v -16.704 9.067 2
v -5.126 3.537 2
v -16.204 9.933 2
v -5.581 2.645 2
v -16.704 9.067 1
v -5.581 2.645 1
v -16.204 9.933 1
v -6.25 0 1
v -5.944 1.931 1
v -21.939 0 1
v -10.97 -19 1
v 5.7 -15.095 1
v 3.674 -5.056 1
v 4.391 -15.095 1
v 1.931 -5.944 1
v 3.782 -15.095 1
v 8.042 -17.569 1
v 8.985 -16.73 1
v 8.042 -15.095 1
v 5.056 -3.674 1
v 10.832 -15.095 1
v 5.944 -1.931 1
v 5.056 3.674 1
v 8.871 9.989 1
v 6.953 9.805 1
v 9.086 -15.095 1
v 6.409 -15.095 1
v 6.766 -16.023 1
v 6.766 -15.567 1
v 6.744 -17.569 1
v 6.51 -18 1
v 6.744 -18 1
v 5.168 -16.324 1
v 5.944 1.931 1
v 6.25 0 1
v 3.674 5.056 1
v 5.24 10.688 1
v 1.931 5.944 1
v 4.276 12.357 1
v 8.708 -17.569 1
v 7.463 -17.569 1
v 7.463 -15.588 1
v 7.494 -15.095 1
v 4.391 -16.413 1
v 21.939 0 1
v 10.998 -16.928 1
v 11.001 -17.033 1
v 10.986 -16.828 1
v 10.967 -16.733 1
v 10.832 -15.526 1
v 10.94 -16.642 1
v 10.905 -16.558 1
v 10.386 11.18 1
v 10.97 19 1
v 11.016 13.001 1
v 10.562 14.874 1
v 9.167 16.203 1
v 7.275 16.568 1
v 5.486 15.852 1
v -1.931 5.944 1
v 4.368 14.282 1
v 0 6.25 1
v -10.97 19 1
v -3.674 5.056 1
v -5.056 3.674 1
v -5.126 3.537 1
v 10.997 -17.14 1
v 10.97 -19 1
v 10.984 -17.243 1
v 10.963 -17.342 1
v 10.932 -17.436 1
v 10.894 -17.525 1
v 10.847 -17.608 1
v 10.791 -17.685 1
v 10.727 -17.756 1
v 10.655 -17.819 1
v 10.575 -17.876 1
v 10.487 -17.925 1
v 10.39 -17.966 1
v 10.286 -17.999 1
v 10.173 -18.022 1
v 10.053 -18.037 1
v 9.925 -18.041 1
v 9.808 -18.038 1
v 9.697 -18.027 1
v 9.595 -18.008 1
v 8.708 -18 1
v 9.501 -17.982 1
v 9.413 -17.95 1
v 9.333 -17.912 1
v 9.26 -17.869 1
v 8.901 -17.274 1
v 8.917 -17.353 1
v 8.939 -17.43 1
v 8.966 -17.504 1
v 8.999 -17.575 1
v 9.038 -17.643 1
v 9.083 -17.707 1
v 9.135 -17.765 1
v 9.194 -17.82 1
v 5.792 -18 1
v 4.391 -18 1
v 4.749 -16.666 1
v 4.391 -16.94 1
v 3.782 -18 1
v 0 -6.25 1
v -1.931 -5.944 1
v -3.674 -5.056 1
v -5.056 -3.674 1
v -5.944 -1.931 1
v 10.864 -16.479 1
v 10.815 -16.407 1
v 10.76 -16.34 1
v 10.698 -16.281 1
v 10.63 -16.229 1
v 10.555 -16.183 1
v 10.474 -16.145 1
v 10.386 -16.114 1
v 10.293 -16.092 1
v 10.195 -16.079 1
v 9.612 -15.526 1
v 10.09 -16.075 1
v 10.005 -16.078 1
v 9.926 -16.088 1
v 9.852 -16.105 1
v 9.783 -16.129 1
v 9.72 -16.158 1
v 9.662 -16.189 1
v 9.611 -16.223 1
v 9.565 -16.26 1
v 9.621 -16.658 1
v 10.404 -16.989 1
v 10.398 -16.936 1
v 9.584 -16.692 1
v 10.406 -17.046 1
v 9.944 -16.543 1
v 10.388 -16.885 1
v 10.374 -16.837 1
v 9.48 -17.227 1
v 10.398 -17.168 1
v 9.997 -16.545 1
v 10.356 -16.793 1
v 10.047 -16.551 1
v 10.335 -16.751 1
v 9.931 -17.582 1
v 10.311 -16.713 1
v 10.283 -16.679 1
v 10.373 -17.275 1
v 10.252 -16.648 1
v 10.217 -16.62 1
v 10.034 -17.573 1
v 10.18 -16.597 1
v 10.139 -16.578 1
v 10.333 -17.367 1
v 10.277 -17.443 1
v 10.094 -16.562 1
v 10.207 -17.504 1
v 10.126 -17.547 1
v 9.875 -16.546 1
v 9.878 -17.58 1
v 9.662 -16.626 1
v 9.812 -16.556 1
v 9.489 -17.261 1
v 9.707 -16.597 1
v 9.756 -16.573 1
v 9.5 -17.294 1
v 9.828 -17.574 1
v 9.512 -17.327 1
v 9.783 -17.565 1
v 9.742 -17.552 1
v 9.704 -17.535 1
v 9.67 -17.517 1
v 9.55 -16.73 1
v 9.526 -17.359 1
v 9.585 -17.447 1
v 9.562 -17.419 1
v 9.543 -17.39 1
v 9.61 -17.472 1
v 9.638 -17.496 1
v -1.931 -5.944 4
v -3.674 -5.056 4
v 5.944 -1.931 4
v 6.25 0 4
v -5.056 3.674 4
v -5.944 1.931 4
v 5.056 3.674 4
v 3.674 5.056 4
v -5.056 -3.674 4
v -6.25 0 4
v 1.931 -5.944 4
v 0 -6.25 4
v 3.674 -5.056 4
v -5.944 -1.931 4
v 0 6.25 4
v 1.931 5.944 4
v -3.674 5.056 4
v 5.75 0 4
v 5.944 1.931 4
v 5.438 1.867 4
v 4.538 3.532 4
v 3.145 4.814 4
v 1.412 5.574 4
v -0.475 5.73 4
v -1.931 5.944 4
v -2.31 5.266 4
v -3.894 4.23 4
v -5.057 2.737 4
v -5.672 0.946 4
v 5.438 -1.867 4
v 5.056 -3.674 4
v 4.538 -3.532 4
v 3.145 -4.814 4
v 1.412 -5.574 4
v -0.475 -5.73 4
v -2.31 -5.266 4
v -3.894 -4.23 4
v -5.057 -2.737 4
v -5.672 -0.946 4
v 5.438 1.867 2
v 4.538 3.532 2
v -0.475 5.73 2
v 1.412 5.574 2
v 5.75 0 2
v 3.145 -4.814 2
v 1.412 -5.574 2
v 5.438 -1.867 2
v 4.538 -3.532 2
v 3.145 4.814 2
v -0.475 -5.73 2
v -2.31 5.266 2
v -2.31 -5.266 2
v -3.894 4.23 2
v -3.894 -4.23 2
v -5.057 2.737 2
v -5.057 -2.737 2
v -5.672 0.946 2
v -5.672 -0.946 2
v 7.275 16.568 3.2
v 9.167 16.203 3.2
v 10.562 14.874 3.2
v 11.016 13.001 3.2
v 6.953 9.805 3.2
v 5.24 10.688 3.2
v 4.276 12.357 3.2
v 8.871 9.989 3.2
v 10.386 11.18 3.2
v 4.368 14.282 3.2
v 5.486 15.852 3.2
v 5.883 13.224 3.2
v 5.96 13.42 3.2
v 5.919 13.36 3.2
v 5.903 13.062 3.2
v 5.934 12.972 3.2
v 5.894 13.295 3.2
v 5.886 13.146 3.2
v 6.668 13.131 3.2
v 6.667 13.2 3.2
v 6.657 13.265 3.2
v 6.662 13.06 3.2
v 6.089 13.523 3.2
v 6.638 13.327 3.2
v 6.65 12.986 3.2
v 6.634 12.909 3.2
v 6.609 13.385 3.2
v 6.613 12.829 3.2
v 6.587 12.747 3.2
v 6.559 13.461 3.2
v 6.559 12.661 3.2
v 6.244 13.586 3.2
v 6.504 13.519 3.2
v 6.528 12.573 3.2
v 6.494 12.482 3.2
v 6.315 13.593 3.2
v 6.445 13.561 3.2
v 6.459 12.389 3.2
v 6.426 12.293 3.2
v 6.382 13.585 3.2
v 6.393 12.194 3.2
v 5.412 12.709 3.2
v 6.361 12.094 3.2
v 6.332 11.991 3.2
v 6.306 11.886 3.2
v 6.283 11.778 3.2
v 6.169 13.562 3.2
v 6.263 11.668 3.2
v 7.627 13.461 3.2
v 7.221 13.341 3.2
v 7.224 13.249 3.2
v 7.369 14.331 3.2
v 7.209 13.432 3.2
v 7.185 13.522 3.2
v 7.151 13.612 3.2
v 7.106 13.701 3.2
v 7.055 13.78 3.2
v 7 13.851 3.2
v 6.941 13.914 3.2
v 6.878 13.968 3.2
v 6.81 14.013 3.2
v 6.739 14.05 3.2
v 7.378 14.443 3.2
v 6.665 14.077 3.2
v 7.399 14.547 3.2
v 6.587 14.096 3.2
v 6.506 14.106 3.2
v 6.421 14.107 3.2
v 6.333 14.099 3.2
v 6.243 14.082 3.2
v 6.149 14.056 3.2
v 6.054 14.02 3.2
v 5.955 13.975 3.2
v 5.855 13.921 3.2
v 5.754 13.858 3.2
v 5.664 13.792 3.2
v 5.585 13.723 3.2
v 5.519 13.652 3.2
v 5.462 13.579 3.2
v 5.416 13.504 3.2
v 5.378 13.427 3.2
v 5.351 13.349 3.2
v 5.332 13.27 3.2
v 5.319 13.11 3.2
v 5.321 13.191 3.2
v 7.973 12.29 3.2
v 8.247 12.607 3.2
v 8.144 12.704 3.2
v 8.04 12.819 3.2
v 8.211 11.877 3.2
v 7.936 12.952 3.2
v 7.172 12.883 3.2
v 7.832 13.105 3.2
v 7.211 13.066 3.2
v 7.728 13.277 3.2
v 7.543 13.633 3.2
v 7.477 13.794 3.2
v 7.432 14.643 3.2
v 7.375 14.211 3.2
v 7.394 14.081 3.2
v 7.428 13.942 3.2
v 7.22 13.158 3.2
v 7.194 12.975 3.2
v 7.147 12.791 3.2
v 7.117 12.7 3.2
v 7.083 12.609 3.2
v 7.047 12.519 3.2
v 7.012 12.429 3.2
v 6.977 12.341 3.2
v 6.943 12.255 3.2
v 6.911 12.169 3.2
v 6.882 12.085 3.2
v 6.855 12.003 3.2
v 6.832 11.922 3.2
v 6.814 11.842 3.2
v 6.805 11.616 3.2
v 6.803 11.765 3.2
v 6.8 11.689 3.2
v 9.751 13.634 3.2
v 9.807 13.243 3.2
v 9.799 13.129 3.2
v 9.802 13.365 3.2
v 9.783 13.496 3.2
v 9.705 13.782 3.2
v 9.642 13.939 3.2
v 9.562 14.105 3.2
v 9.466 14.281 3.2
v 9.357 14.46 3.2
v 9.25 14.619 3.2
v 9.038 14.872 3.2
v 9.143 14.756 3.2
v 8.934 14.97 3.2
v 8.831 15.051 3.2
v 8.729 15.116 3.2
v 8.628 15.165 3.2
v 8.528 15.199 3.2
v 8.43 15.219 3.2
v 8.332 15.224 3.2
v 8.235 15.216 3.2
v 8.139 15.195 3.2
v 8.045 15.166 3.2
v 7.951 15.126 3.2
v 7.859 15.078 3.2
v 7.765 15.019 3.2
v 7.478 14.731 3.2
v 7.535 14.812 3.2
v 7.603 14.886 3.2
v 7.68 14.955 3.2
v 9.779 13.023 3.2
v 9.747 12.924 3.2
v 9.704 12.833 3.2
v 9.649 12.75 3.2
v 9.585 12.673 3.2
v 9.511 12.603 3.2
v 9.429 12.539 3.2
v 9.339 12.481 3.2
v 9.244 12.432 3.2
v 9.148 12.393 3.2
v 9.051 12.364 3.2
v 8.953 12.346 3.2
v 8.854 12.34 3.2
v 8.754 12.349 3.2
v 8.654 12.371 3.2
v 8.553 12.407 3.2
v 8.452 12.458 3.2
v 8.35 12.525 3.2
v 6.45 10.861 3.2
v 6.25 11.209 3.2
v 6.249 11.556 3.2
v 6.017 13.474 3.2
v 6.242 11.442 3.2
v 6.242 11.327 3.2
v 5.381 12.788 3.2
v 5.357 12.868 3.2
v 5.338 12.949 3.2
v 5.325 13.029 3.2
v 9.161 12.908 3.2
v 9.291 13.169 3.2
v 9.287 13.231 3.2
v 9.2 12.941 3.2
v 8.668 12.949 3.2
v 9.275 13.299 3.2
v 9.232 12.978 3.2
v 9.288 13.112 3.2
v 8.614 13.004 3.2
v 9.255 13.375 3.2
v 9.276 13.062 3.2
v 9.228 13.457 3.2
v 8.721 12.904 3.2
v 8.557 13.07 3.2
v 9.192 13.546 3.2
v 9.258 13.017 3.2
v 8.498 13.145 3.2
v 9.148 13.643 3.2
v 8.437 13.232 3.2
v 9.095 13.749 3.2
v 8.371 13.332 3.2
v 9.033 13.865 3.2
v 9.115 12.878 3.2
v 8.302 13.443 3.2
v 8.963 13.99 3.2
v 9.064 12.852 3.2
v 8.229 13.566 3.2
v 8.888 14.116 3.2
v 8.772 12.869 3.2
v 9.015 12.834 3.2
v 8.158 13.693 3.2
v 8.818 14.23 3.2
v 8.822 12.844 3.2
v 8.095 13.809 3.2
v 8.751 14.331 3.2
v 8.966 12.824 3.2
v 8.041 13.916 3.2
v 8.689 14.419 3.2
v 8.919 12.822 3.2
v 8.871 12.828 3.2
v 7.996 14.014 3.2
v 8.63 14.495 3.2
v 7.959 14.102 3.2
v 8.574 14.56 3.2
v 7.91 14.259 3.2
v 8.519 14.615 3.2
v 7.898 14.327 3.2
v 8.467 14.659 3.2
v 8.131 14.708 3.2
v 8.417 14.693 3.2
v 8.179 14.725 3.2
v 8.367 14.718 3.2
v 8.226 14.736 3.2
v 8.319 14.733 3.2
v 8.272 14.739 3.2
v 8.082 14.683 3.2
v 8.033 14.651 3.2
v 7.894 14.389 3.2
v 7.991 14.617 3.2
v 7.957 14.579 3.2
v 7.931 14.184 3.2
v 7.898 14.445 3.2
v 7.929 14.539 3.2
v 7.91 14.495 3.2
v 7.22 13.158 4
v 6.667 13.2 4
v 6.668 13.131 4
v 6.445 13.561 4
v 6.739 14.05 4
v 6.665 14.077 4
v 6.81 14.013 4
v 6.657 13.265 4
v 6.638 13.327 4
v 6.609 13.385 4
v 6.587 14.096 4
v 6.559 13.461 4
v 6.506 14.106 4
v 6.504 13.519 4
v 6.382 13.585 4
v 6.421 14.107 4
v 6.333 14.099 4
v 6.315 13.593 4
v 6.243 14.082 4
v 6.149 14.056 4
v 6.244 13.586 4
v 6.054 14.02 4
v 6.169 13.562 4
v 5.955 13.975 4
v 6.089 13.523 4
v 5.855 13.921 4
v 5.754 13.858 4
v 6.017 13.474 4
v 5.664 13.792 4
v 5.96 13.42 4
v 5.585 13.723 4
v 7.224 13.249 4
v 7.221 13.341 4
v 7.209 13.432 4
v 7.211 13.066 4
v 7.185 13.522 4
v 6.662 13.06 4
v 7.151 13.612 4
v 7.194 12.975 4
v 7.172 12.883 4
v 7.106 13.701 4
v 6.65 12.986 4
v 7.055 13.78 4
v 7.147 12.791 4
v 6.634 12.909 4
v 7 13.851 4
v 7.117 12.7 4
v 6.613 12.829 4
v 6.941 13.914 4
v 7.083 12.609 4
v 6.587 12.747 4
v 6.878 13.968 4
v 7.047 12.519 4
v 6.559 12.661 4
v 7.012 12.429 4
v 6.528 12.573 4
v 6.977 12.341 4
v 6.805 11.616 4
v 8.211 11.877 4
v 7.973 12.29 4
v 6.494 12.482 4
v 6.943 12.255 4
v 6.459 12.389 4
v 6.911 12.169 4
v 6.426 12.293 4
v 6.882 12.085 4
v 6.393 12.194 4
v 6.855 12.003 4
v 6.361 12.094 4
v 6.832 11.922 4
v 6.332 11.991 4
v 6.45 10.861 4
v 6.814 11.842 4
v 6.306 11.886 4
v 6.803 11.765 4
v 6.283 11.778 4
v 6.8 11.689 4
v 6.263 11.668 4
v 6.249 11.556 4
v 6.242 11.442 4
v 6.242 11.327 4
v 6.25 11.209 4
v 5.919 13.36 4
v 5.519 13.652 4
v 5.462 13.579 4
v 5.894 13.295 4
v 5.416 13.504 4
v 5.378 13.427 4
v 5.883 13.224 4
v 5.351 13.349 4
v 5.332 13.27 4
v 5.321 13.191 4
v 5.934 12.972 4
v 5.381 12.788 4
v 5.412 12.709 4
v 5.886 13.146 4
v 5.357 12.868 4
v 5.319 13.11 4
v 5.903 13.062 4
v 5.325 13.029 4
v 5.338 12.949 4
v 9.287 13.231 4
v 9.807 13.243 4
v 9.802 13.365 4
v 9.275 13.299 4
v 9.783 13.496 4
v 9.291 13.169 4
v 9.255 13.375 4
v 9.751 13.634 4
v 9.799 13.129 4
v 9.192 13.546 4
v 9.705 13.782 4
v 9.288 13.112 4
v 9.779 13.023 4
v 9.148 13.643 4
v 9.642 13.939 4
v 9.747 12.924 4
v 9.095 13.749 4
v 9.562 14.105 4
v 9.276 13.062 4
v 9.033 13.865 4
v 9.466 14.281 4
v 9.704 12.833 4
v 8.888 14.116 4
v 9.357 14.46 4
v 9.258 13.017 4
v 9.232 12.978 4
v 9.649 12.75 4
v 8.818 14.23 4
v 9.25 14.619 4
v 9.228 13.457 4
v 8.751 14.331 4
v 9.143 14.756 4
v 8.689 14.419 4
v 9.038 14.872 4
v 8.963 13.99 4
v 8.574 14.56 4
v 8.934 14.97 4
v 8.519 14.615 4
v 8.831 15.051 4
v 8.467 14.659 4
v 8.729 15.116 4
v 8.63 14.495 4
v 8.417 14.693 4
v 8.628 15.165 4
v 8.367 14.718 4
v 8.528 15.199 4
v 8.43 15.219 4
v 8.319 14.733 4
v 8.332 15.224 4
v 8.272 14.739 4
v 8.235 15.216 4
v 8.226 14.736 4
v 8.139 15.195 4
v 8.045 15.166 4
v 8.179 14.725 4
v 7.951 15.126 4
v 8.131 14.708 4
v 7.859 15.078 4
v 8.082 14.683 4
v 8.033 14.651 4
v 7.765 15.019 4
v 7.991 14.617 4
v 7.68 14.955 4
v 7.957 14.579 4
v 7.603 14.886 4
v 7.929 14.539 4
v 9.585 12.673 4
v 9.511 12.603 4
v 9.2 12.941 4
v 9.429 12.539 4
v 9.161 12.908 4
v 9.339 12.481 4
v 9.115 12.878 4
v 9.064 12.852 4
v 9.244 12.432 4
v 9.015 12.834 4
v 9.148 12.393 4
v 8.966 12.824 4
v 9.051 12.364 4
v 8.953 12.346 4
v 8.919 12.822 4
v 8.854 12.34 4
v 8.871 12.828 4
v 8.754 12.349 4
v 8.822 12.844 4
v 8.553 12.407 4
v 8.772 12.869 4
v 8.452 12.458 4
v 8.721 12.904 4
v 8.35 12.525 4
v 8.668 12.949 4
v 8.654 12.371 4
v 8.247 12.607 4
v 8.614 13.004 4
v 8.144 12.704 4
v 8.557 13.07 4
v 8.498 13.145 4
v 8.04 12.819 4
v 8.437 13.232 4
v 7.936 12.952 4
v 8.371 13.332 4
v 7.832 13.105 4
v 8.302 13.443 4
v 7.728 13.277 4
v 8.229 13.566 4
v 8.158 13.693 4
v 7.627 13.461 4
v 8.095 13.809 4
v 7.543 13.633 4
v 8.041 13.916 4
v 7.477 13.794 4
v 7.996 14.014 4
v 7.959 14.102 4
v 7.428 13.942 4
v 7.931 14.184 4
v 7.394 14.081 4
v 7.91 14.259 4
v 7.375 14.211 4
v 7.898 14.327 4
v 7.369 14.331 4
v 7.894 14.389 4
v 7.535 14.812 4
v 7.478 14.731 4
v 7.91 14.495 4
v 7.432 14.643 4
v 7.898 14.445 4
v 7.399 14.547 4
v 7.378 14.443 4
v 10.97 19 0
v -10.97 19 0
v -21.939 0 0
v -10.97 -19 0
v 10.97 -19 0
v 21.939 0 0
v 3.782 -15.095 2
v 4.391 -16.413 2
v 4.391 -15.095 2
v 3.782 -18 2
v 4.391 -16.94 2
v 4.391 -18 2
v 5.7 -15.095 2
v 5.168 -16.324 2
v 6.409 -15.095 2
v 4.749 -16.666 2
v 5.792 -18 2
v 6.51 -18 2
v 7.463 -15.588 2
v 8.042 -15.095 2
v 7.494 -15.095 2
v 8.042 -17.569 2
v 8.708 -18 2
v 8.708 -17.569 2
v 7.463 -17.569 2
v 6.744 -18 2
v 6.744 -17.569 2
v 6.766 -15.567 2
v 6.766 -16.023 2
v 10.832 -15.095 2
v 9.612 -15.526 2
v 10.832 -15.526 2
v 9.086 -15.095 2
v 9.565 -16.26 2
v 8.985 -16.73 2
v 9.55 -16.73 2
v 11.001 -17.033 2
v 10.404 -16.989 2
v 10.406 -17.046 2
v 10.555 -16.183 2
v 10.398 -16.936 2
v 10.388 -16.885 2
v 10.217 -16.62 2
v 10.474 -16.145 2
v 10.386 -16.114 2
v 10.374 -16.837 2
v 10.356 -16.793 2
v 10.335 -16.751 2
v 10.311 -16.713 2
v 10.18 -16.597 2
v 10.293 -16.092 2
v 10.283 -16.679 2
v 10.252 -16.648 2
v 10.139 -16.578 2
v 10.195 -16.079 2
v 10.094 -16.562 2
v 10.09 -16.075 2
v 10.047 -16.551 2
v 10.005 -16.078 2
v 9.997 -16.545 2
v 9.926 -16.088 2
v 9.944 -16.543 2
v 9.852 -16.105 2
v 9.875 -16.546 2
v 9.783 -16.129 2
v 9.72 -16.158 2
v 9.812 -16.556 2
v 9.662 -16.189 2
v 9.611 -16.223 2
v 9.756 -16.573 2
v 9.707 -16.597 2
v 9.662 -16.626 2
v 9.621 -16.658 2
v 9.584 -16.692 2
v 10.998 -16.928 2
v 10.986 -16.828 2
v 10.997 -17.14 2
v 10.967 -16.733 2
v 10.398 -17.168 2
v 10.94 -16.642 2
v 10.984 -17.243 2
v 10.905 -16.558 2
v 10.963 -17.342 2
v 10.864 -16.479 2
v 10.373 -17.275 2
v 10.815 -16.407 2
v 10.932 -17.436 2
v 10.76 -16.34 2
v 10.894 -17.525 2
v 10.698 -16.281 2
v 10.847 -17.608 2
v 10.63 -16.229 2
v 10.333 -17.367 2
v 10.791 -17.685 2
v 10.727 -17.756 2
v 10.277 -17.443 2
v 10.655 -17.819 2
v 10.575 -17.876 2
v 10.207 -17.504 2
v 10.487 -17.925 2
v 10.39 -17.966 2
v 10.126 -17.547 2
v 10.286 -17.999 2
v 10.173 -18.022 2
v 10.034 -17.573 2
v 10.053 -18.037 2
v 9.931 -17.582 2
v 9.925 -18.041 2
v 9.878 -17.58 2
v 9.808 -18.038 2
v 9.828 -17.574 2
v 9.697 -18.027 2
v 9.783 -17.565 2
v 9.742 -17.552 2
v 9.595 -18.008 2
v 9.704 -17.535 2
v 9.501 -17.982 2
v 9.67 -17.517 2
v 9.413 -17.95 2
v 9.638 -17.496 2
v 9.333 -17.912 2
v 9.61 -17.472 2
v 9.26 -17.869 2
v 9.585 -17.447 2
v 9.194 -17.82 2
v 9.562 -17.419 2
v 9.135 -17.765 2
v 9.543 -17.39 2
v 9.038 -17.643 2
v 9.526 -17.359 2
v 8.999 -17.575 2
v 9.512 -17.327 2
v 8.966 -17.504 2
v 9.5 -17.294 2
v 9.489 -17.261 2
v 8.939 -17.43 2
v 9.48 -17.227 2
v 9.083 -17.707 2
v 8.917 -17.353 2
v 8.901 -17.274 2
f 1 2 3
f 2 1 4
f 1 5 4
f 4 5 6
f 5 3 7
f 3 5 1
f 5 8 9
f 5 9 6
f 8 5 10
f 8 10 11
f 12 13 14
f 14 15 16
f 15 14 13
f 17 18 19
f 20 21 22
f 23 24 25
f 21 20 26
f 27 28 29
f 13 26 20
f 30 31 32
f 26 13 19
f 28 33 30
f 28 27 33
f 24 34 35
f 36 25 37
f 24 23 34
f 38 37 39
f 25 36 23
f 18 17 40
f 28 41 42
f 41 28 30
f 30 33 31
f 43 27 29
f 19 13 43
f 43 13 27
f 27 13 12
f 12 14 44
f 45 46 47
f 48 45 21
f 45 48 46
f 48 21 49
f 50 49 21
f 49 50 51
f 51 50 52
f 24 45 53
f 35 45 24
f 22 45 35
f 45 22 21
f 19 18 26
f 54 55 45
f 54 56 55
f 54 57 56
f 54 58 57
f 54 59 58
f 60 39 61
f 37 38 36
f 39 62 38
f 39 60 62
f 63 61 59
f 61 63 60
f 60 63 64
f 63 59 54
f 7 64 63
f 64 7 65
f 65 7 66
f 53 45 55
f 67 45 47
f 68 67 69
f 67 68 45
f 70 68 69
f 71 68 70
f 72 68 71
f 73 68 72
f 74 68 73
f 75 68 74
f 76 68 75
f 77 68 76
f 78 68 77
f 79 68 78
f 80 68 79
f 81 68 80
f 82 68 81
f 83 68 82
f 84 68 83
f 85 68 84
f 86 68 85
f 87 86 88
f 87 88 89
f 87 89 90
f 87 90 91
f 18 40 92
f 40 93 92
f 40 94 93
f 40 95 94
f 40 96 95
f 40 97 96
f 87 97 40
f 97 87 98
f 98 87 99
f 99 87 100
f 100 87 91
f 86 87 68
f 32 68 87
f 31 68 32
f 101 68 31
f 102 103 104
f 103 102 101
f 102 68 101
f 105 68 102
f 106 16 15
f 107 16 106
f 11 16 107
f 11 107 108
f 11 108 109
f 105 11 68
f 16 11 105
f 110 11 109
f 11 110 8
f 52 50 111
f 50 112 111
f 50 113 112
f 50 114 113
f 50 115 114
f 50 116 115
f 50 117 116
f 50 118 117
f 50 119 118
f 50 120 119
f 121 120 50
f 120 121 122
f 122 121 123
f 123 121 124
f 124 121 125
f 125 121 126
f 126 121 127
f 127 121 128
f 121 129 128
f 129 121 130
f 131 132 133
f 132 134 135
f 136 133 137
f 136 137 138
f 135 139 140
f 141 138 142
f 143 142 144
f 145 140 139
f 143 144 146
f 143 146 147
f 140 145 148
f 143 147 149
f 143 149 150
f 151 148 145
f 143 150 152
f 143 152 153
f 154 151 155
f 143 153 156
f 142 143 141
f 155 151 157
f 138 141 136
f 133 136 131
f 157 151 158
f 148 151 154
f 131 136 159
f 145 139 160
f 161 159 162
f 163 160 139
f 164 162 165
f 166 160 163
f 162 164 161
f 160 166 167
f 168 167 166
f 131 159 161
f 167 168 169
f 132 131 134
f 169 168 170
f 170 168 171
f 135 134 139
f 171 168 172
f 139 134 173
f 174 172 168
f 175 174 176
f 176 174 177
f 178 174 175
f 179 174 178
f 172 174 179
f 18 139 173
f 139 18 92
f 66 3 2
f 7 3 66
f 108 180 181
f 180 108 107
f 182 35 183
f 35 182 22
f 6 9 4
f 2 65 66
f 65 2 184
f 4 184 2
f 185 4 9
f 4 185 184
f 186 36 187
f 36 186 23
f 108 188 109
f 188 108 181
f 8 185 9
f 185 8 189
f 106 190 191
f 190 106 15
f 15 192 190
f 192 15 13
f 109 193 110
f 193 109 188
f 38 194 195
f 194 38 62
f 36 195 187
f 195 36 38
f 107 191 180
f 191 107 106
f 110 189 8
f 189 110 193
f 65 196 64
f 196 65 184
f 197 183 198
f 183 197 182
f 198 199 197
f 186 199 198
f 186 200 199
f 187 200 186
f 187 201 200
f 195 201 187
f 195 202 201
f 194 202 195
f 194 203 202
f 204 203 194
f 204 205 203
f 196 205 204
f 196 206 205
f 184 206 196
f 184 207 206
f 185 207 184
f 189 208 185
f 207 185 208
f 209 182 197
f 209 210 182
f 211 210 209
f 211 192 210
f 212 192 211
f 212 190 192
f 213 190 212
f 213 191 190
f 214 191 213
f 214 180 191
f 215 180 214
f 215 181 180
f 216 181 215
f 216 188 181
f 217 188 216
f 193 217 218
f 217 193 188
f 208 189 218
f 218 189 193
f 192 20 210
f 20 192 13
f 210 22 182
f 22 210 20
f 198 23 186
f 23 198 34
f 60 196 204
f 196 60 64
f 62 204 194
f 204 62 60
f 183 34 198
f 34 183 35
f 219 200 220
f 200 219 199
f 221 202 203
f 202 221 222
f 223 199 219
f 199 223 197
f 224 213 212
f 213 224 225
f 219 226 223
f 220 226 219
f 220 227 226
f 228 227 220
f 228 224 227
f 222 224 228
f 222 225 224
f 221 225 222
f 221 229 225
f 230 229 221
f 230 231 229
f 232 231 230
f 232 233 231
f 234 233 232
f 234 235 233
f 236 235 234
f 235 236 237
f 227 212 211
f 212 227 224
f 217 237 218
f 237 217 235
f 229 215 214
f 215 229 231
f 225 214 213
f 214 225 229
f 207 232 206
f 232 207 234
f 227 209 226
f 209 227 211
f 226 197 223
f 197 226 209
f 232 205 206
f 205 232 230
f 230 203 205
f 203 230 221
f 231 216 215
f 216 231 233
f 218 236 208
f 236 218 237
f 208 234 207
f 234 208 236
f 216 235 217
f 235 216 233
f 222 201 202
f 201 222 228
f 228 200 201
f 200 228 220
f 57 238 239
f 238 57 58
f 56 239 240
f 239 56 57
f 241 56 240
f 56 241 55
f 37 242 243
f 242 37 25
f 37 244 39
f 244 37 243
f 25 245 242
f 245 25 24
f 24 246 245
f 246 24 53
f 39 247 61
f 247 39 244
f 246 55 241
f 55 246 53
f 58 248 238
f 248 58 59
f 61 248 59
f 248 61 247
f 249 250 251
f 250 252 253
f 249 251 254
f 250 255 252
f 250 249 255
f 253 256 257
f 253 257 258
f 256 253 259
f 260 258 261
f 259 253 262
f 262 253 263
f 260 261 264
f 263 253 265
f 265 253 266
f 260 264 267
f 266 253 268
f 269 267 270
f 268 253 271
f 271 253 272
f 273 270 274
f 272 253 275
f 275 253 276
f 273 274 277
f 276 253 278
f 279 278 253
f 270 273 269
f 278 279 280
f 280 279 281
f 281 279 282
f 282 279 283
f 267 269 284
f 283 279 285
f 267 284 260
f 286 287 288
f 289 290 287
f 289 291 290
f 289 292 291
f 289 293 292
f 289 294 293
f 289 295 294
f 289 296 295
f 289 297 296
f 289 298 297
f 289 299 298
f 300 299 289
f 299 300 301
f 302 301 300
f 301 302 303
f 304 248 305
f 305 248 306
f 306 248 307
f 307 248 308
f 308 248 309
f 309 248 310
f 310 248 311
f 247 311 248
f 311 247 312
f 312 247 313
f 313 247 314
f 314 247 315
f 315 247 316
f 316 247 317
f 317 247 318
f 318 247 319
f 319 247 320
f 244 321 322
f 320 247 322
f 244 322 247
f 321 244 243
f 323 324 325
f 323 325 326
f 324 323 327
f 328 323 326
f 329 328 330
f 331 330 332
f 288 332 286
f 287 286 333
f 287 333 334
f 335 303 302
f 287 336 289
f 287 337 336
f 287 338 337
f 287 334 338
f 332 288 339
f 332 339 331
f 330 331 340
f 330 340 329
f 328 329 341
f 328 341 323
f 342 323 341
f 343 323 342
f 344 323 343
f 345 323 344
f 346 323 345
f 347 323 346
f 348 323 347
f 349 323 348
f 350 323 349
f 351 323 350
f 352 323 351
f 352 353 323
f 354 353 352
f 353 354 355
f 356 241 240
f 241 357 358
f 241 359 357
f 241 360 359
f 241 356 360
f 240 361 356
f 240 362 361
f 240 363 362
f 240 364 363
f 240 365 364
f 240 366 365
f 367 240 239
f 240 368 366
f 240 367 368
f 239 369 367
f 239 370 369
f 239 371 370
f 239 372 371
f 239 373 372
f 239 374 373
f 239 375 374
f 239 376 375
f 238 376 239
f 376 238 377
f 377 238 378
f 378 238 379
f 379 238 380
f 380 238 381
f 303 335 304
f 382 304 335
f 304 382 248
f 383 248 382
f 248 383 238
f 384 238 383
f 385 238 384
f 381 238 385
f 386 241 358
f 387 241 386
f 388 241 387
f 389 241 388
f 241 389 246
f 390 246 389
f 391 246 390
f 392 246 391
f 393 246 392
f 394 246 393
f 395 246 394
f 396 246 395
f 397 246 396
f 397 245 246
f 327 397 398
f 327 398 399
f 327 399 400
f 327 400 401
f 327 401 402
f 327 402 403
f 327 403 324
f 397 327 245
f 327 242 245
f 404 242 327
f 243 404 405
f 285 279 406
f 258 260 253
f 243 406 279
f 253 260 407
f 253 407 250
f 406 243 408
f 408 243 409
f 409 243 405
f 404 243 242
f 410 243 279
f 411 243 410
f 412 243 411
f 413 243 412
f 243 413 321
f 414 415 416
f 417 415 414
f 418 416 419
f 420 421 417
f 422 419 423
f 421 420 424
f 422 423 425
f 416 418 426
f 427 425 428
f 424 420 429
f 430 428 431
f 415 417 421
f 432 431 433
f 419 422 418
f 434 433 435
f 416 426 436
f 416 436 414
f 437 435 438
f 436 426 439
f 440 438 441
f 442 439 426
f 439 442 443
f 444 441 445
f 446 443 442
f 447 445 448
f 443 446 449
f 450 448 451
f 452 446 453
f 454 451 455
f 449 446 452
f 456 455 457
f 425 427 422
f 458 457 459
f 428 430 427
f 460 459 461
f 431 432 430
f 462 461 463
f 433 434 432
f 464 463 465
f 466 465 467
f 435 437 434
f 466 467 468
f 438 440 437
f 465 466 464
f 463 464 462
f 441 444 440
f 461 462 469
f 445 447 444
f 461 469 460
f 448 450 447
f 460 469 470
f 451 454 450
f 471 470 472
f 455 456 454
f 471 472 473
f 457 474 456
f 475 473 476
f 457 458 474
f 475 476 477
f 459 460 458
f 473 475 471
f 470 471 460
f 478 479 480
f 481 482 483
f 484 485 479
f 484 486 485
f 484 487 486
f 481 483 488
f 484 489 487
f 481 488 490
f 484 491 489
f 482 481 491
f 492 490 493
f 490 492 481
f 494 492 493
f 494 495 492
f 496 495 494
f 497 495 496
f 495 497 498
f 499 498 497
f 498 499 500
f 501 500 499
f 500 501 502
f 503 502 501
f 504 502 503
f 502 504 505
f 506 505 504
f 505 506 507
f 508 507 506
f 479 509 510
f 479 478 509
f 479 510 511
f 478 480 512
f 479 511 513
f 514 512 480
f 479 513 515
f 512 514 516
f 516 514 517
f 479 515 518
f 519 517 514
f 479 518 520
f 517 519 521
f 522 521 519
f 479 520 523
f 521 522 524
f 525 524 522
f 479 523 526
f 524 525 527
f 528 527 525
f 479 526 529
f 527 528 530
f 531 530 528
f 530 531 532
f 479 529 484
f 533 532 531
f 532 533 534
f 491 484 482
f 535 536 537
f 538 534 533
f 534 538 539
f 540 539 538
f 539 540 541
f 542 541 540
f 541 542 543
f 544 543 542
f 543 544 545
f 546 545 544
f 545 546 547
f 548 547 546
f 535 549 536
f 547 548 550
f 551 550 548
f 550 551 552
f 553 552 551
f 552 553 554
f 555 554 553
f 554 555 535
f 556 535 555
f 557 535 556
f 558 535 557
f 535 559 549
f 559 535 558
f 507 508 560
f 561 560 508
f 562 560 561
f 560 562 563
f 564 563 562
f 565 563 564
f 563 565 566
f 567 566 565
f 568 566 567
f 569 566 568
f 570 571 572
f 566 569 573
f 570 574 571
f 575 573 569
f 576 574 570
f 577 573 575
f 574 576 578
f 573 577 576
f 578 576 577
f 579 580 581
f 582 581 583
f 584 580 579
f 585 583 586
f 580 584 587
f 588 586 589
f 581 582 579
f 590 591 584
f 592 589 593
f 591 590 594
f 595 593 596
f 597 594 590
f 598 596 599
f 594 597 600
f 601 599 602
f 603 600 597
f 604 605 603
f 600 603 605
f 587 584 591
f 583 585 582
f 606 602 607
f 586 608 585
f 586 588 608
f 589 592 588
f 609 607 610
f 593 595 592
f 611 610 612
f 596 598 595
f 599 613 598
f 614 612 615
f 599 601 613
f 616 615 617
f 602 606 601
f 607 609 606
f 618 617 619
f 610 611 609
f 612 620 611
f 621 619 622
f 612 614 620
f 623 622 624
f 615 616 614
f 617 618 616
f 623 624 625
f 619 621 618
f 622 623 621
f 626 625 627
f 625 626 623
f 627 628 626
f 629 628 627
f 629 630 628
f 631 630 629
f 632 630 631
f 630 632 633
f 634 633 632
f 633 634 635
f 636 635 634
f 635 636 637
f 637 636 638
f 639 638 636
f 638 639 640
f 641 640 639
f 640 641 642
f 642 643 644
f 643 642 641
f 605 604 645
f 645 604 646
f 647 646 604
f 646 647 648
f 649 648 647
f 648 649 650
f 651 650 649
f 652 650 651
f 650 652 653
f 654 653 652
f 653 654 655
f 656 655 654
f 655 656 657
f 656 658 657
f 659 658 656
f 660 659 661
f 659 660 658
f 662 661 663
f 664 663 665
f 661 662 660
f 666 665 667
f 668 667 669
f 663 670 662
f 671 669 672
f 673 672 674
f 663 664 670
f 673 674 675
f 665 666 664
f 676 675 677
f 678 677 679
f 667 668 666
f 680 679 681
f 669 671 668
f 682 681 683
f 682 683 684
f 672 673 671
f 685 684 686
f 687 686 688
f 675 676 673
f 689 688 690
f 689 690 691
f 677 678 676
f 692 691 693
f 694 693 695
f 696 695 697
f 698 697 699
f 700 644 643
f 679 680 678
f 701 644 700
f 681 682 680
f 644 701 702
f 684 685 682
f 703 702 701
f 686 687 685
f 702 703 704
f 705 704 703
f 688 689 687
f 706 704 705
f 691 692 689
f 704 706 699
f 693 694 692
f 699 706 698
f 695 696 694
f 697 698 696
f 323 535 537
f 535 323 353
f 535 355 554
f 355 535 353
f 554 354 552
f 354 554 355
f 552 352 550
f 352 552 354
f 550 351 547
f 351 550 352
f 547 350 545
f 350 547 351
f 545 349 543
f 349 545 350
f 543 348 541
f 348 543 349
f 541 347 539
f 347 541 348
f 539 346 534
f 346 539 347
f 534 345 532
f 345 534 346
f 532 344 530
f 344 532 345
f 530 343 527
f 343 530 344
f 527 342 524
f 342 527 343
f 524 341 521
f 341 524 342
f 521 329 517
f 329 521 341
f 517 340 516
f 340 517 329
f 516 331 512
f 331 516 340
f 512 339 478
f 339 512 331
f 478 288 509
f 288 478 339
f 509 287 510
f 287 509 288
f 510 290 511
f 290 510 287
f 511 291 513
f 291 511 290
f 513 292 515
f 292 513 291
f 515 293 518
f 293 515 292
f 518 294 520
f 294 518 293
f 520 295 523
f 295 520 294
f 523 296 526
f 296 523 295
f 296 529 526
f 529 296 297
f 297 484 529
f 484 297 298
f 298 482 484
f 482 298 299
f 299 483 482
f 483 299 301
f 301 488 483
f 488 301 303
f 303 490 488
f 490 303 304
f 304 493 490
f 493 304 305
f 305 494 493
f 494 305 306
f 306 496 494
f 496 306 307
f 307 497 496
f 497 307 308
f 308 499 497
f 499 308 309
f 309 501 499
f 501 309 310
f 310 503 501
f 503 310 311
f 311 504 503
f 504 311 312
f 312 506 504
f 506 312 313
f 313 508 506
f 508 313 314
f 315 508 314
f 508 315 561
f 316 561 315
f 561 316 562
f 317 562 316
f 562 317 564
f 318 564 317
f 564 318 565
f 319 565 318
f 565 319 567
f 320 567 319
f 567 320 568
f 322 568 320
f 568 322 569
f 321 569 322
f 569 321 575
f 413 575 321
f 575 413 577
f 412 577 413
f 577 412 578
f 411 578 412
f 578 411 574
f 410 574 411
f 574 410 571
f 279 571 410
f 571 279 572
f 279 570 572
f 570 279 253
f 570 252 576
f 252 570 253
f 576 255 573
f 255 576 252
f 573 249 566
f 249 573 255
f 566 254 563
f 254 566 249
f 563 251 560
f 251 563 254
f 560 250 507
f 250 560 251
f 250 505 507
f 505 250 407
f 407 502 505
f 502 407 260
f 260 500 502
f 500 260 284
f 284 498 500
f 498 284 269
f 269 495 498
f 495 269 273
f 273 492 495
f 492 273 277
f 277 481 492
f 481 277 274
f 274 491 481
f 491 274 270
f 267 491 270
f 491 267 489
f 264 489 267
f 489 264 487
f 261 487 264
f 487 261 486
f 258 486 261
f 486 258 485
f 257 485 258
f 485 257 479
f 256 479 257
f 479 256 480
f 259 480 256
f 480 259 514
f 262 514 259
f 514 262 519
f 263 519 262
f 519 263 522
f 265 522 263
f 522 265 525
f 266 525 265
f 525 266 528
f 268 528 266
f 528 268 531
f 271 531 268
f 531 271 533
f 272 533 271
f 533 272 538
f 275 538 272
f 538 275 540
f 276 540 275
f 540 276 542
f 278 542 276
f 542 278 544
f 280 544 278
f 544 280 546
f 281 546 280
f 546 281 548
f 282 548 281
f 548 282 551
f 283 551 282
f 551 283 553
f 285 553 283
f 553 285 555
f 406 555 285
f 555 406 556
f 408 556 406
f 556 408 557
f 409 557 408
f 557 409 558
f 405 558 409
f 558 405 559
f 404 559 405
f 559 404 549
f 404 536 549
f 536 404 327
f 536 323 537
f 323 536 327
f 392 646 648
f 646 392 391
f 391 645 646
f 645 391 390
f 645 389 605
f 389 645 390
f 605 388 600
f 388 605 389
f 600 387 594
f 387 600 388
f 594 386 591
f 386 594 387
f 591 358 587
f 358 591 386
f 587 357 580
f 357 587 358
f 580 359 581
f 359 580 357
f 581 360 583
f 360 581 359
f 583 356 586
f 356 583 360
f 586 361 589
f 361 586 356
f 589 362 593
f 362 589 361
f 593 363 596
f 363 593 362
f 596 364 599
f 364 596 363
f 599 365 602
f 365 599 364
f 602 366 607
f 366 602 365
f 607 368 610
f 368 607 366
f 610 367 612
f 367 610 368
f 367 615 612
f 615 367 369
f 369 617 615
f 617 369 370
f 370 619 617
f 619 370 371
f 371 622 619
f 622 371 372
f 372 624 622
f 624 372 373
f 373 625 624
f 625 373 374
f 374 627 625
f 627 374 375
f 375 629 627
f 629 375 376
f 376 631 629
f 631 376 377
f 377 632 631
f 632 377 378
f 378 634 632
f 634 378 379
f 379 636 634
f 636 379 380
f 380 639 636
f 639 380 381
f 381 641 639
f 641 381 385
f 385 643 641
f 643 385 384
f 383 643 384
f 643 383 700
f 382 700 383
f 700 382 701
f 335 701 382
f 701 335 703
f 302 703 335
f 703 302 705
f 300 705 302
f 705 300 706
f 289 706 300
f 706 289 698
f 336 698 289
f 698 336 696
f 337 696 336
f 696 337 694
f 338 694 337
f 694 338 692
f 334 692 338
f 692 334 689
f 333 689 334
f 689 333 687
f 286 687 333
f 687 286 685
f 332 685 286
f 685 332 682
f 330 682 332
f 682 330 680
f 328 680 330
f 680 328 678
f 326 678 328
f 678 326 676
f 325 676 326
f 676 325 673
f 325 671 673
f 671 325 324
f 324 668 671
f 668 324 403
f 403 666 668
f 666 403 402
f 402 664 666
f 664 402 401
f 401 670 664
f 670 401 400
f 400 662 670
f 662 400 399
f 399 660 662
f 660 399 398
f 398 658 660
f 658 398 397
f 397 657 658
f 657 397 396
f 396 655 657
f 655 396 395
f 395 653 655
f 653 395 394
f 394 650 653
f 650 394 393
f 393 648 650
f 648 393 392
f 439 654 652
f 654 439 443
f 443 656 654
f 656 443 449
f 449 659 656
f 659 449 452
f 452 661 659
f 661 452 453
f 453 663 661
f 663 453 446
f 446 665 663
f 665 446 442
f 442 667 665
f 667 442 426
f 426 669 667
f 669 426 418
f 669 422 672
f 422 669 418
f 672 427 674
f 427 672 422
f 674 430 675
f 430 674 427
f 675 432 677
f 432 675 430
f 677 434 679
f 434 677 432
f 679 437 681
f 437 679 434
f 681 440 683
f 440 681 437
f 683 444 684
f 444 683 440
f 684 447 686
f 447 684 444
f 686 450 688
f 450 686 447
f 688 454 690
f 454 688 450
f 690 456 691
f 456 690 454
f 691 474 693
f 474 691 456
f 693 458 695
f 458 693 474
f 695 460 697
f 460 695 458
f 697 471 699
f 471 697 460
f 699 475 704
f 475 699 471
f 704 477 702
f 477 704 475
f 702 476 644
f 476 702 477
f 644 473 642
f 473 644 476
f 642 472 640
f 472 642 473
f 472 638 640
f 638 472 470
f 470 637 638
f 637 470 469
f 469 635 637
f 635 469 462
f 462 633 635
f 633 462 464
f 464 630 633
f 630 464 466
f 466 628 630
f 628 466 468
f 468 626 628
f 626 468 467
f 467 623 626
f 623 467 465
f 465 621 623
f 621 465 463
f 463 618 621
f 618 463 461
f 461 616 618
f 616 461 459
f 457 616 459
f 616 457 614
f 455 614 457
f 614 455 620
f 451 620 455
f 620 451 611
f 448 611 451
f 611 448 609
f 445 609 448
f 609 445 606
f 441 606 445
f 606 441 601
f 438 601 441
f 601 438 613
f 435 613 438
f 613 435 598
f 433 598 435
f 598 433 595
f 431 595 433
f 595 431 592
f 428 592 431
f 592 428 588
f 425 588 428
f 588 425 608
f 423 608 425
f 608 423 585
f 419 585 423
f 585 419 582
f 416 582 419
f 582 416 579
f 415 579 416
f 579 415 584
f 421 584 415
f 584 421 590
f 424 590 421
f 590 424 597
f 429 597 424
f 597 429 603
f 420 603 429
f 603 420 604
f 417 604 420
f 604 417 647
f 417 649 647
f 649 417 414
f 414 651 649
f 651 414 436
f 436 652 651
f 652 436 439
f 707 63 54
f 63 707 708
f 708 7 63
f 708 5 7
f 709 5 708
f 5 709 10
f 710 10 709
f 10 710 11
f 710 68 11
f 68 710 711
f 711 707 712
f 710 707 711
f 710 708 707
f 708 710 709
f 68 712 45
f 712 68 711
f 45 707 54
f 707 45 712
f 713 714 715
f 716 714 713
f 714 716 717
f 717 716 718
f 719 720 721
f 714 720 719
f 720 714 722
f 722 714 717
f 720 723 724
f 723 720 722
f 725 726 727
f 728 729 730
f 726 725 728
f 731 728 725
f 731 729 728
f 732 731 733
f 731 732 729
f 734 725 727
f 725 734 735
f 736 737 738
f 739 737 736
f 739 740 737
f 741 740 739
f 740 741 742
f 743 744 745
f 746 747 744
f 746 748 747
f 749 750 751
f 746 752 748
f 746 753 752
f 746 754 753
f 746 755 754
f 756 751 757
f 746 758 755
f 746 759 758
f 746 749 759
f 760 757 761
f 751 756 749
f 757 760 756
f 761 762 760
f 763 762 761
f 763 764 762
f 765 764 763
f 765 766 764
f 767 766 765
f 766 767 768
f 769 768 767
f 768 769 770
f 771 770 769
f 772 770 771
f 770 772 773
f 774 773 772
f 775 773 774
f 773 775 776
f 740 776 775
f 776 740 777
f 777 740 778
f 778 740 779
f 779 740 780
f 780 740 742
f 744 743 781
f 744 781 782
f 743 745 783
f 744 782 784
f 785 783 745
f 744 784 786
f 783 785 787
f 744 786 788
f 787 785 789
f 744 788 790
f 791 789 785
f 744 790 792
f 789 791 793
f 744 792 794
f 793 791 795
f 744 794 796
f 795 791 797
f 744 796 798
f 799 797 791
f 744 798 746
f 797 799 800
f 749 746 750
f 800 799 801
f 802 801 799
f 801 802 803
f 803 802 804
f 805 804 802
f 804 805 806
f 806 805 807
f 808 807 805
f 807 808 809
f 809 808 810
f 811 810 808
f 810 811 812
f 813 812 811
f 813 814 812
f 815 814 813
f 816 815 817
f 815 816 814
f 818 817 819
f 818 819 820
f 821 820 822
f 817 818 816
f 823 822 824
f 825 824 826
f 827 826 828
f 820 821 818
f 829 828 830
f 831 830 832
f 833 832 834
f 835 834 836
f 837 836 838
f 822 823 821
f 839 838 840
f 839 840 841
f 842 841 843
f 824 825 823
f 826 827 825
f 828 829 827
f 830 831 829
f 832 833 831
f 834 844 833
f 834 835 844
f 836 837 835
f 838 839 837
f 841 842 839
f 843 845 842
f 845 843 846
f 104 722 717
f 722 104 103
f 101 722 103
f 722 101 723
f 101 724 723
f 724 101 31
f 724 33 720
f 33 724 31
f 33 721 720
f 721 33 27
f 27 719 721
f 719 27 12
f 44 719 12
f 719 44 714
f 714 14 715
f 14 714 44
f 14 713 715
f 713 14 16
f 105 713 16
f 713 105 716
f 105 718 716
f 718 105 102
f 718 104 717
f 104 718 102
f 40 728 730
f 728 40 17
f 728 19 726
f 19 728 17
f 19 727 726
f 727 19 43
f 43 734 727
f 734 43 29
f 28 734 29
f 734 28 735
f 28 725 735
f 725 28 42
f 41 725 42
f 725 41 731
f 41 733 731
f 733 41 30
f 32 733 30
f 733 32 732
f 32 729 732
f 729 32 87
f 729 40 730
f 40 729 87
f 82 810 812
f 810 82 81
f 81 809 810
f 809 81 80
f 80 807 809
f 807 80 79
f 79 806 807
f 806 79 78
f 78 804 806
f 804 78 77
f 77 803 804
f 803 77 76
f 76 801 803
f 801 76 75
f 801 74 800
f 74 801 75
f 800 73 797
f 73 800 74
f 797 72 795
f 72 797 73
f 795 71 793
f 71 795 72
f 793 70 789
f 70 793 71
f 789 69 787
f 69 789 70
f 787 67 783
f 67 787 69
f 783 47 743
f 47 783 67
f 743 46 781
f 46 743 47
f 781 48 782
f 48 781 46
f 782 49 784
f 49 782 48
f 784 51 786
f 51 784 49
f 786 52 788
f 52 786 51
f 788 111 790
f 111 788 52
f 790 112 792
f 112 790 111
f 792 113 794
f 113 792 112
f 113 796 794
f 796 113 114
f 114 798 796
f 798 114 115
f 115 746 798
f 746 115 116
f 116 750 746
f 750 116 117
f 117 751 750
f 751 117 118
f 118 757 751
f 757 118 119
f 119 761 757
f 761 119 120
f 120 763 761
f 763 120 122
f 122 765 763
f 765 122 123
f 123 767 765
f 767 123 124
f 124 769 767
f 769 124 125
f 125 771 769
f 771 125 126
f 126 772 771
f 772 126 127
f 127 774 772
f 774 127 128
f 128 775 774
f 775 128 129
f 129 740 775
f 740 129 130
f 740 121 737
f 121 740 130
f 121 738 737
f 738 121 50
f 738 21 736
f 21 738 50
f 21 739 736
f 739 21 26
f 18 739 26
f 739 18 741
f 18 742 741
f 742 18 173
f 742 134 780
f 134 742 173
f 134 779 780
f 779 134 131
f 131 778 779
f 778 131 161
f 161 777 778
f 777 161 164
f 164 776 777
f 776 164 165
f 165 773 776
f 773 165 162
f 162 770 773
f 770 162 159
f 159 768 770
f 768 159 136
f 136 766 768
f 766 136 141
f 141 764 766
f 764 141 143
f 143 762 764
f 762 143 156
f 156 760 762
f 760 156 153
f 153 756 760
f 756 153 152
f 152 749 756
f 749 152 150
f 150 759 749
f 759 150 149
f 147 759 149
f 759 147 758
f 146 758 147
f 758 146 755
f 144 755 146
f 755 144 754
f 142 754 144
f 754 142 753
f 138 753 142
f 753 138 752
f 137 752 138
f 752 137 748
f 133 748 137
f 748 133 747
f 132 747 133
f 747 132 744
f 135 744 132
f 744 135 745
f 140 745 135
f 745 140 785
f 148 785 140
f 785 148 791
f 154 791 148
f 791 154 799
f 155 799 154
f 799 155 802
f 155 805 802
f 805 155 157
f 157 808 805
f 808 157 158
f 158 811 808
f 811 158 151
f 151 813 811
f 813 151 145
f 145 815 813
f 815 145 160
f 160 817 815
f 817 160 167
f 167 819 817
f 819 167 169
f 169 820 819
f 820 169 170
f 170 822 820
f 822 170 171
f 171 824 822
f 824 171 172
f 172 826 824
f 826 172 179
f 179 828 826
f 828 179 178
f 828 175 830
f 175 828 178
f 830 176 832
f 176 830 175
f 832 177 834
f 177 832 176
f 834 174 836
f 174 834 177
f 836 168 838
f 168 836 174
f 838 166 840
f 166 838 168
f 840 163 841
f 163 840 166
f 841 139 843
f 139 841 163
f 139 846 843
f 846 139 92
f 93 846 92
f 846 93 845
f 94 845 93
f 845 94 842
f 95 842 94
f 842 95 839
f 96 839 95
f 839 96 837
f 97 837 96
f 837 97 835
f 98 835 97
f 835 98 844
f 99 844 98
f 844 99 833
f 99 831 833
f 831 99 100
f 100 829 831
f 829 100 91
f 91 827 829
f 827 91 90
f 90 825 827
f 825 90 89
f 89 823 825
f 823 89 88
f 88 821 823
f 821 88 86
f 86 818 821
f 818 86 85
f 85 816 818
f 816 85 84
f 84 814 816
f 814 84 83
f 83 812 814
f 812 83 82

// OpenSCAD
include <../../Scripts/18xx tiles basic functions.scad>
hex("Blue");
single_city([1]);
put_tilenr("K15");
put_value_blue("20",30);
